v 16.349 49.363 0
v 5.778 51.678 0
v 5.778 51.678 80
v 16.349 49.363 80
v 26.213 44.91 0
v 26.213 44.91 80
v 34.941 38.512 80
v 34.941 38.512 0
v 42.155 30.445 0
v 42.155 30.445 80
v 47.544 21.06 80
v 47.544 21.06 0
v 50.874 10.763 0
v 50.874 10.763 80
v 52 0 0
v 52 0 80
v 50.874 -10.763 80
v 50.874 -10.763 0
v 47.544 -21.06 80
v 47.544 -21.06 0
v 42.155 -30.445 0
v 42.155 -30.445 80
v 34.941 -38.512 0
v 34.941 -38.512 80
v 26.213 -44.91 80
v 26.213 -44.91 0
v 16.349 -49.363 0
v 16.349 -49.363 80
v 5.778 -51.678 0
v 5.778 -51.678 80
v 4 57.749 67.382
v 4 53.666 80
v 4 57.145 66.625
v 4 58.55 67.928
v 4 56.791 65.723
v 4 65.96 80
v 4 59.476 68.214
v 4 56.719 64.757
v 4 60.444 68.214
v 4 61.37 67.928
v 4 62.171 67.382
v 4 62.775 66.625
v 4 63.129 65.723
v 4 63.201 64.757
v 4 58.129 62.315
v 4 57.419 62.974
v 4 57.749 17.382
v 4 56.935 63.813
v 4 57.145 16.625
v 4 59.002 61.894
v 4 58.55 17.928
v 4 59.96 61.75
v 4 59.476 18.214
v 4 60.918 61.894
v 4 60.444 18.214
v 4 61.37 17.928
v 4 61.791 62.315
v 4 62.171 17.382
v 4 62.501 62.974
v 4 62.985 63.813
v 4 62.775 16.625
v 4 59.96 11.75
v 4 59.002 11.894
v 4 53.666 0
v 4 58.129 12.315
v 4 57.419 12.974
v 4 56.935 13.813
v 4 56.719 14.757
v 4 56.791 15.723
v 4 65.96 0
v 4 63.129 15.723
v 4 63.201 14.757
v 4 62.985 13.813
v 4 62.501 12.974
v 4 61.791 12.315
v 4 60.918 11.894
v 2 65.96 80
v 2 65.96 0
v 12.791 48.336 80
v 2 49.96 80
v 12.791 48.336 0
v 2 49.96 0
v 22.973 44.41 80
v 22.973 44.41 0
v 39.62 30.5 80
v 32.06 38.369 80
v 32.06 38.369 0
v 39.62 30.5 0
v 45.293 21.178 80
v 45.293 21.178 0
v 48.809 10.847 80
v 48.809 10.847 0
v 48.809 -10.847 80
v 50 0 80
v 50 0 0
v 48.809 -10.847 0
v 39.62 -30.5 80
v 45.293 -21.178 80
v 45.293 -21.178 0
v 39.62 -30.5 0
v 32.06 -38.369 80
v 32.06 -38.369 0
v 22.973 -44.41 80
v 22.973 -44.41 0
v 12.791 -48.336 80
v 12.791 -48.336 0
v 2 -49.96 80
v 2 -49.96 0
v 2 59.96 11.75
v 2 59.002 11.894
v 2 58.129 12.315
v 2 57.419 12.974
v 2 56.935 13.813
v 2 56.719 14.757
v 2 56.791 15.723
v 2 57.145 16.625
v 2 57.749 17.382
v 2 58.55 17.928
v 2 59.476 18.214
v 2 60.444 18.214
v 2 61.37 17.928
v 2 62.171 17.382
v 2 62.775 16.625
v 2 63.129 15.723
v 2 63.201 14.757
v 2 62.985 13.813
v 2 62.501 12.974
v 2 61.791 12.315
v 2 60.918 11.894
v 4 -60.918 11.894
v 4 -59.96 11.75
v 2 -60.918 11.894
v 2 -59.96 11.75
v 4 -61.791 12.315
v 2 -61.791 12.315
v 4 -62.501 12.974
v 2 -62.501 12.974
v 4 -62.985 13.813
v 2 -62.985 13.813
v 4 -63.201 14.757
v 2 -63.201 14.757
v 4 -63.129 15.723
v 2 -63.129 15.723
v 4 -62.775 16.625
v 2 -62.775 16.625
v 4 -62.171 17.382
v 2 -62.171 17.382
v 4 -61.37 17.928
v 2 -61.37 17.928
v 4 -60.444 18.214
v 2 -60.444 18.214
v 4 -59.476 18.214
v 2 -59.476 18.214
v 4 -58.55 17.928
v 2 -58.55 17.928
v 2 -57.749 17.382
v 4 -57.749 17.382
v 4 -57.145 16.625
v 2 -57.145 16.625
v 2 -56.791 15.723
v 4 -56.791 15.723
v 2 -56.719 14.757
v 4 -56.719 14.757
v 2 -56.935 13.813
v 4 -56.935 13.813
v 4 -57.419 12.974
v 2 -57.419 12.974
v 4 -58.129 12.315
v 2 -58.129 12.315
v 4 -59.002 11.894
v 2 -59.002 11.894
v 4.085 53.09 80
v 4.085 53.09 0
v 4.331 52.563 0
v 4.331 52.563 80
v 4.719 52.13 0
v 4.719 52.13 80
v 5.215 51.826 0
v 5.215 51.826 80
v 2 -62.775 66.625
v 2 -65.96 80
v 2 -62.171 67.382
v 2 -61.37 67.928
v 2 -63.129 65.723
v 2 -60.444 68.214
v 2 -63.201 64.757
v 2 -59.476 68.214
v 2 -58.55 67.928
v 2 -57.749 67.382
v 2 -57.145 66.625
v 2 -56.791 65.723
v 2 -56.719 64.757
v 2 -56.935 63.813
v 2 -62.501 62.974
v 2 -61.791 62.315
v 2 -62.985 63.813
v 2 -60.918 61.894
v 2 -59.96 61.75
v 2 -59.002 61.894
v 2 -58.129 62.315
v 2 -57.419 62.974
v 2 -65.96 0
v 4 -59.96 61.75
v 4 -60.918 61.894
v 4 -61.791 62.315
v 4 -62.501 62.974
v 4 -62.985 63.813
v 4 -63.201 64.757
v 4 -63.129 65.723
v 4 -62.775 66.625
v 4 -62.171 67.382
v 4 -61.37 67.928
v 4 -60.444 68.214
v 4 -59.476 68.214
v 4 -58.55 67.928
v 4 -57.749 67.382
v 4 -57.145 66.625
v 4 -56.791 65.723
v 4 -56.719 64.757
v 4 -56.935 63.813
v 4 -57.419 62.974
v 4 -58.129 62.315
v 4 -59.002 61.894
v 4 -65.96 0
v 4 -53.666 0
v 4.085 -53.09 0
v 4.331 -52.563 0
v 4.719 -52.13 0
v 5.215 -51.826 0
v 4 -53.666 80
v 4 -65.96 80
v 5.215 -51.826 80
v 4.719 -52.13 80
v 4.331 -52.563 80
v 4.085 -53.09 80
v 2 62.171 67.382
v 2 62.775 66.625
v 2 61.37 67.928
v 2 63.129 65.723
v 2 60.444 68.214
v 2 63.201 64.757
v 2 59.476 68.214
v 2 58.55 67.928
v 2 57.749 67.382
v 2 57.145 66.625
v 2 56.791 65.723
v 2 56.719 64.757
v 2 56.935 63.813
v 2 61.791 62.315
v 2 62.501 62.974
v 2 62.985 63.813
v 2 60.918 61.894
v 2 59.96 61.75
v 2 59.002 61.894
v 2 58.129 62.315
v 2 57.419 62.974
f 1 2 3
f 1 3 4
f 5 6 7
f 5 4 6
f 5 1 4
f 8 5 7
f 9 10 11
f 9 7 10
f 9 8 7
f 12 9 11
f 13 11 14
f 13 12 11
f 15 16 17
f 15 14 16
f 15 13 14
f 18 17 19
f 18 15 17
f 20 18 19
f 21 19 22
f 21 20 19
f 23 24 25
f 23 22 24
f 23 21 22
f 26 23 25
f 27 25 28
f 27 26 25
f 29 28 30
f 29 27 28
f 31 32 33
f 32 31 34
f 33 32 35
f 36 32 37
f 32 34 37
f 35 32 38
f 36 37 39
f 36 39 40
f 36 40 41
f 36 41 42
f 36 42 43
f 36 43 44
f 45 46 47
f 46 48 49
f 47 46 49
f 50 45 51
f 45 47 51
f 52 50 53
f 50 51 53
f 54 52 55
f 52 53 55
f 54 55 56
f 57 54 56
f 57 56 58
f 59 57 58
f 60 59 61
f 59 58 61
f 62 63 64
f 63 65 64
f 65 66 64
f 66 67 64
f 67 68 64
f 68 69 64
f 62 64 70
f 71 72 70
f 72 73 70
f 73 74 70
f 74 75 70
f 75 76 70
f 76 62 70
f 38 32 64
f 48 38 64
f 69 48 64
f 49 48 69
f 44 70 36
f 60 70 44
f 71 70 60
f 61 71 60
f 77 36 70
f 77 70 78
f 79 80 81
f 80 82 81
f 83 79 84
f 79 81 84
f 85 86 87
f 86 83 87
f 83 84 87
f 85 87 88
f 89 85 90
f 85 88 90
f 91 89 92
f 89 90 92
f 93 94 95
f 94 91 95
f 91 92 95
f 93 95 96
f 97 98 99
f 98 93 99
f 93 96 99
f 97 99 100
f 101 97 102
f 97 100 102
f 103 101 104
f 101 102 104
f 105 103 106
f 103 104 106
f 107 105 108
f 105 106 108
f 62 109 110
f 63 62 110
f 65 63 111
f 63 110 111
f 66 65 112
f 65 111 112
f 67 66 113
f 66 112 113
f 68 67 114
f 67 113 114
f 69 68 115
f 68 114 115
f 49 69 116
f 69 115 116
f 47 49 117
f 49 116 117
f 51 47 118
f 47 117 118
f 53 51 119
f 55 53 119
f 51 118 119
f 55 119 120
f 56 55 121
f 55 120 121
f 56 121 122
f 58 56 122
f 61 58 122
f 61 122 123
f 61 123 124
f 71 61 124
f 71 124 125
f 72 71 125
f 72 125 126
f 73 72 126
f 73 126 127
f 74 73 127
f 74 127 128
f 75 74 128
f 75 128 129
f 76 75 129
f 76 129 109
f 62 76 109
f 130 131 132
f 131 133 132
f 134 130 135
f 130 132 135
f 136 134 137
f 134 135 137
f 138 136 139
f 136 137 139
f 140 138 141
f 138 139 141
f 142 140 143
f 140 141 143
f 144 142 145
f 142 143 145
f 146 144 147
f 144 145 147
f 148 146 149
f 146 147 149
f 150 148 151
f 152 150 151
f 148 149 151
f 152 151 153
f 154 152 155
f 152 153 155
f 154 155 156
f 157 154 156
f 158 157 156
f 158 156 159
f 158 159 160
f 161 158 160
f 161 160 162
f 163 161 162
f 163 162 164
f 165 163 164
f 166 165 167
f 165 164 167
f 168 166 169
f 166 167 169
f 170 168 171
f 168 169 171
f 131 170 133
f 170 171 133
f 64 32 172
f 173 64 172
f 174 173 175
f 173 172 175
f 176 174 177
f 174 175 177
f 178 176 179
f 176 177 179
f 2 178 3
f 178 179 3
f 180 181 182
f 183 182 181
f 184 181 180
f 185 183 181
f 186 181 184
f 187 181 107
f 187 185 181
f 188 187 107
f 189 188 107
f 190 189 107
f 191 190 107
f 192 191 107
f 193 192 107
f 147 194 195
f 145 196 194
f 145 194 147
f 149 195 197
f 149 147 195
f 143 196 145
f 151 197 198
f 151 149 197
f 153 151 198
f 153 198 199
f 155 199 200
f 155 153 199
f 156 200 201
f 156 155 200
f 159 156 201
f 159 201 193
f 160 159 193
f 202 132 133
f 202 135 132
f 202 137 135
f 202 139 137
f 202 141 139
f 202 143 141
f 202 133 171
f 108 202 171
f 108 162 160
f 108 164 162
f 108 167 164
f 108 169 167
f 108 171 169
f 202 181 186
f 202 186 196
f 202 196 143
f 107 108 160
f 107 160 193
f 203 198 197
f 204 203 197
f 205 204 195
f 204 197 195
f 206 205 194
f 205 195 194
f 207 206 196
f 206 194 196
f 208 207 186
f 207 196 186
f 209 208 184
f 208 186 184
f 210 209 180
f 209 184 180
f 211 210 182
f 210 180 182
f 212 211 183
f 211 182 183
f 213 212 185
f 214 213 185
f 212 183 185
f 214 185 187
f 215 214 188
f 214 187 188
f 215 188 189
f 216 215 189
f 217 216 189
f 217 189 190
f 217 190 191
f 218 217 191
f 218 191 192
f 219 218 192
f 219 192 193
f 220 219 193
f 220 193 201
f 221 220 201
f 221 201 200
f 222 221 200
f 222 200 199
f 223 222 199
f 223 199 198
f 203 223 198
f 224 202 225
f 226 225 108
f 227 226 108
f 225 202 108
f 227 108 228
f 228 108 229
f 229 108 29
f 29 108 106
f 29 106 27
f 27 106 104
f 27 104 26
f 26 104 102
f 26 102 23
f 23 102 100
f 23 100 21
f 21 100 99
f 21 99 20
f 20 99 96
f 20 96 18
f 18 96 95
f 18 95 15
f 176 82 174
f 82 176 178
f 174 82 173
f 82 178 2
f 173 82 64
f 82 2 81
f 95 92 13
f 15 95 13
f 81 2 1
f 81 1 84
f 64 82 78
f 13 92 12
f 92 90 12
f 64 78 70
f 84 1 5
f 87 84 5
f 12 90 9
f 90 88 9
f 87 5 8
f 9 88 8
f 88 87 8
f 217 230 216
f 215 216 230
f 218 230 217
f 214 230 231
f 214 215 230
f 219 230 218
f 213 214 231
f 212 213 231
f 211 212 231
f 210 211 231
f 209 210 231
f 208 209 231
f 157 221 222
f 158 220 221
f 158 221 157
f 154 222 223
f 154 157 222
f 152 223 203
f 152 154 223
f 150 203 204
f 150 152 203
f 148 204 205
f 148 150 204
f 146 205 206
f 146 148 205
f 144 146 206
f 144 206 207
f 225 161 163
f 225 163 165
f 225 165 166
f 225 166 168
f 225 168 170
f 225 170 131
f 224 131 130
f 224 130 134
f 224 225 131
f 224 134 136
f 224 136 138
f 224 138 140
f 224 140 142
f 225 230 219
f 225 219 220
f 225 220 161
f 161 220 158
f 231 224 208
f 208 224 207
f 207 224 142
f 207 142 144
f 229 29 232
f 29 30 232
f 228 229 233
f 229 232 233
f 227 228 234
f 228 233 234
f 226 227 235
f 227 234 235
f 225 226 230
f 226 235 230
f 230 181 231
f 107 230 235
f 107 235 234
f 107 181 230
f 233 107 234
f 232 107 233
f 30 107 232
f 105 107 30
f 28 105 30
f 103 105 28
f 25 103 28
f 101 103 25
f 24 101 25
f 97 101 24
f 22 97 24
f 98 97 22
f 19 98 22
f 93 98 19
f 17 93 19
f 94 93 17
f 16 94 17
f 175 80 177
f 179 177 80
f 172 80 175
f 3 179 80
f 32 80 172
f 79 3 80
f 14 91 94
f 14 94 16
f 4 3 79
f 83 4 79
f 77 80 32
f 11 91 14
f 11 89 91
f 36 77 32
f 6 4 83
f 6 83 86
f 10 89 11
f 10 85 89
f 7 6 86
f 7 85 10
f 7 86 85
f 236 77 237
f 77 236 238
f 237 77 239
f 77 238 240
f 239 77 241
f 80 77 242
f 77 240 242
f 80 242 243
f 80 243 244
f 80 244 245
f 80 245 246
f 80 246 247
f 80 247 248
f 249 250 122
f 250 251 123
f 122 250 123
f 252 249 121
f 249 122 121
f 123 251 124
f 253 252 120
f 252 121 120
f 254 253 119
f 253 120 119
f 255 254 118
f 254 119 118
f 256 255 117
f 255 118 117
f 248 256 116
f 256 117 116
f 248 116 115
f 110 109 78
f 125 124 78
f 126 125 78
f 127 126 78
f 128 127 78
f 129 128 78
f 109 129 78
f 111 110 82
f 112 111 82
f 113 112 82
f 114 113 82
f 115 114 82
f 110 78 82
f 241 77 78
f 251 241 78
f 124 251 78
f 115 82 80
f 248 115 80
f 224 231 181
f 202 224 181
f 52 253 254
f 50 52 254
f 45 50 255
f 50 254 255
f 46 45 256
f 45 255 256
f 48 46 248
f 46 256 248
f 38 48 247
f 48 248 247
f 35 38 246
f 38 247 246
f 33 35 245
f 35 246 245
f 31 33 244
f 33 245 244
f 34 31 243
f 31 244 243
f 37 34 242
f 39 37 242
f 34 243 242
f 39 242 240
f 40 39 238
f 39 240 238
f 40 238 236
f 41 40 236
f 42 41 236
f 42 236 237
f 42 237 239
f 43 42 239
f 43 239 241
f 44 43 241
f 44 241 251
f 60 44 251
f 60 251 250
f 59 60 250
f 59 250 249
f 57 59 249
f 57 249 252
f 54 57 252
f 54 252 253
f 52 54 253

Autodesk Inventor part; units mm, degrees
ref_plane "YZ Plane" through (0, 0, 0) normal (1, 0, 0) x (0, 1, 0)
ref_plane "XZ Plane" through (0, 0, 0) normal (0, 1, 0) x (-1, 0, 0)
ref_plane "XY Plane" through (0, 0, 0) normal (0, 0, 1) x (1, 0, 0)
sketch "Sketch2" plane through (0, 0, 0) normal (0, 0, 1) x (1, 0, 0)
  arc A0 (0, -52) -> (0, 52) centre (0, 0) ccw
  arc A1 (0, -50) -> (0, 50) centre (0, 0) ccw
  line L0 (0, 52) -> (0, 50)
  line L1 (0, -50) -> (0, -52)
  line L2 (2, 49.96) -> (4, 49.96)
  line L3 (4, 49.96) -> (4, 65.96)
  line L4 (4, 65.96) -> (2, 65.96)
  line L5 (2, 65.96) -> (2, 49.96)
  line L6 (2, -49.96) -> (4, -49.96)
  line L7 (4, -49.96) -> (4, -65.96)
  line L8 (4, -65.96) -> (2, -65.96)
  line L9 (2, -65.96) -> (2, -49.96)
  line L10 (0, 92.344) -> (0, -92.344) construction
  point P0 (4, -51.8459)
  point P1 (4, 51.8459)
  dimension "d0" = 104
  dimension "d1" = 100
  dimension "d2" = 2
  dimension "d40" = 2
  dimension "d41" = 2
  dimension "d42" = 16
  dimension "d43" = 16
  dimension "d44" = 2
  dimension "d45" = 2
extrude "Extrusion1" add sketch "Sketch2" along normal blind 80 contours L9 L6 L7 A0 | A0 L7 L8 L9 | L7 L6 A1 L2 L3 A0 | L3 L2 L5 A0 | A0 L5 L4 L3
fillet "Fillet4" radius 2 2 edges at (4, 51.8459, 40) (4, -51.8459, 40)
sketch "Sketch6" plane through (4, -65.96, 80) normal (1, 0, 0) x (0, 0, -1)
  line L0 (80, 16) -> (80, 0) construction
  line L1 (80, 0) -> (0, 0) construction
  line L2 (0, 16) -> (0, 0) construction
  line L3 (80, 16) -> (0, 16) construction
  line L4 (80, 131.92) -> (80, 115.92) construction
  line L5 (80, 115.92) -> (0, 115.92) construction
  line L6 (0, 131.92) -> (0, 115.92) construction
  line L7 (80, 131.92) -> (0, 131.92) construction
  point P0 (80, 65.96)
  point P1 (15, 6)
  point P2 (65, 6)
  point P3 (65, 125.92)
  point P4 (15, 125.92)
  dimension "d47" = 15
  dimension "d48" = 15
  dimension "d49" = 15
  dimension "d50" = 15
  dimension "d51" = 6
  dimension "d52" = 6
  dimension "d53" = 6
  dimension "d54" = 6
hole "Hole3" at (4, -59.96, 65) at (4, -59.96, 15) at (4, 59.96, 15) at (4, 59.96, 65) direction (-1, 0, 0) diameter 6.5 depth 2
properties part number "P050_SupportTube2"
